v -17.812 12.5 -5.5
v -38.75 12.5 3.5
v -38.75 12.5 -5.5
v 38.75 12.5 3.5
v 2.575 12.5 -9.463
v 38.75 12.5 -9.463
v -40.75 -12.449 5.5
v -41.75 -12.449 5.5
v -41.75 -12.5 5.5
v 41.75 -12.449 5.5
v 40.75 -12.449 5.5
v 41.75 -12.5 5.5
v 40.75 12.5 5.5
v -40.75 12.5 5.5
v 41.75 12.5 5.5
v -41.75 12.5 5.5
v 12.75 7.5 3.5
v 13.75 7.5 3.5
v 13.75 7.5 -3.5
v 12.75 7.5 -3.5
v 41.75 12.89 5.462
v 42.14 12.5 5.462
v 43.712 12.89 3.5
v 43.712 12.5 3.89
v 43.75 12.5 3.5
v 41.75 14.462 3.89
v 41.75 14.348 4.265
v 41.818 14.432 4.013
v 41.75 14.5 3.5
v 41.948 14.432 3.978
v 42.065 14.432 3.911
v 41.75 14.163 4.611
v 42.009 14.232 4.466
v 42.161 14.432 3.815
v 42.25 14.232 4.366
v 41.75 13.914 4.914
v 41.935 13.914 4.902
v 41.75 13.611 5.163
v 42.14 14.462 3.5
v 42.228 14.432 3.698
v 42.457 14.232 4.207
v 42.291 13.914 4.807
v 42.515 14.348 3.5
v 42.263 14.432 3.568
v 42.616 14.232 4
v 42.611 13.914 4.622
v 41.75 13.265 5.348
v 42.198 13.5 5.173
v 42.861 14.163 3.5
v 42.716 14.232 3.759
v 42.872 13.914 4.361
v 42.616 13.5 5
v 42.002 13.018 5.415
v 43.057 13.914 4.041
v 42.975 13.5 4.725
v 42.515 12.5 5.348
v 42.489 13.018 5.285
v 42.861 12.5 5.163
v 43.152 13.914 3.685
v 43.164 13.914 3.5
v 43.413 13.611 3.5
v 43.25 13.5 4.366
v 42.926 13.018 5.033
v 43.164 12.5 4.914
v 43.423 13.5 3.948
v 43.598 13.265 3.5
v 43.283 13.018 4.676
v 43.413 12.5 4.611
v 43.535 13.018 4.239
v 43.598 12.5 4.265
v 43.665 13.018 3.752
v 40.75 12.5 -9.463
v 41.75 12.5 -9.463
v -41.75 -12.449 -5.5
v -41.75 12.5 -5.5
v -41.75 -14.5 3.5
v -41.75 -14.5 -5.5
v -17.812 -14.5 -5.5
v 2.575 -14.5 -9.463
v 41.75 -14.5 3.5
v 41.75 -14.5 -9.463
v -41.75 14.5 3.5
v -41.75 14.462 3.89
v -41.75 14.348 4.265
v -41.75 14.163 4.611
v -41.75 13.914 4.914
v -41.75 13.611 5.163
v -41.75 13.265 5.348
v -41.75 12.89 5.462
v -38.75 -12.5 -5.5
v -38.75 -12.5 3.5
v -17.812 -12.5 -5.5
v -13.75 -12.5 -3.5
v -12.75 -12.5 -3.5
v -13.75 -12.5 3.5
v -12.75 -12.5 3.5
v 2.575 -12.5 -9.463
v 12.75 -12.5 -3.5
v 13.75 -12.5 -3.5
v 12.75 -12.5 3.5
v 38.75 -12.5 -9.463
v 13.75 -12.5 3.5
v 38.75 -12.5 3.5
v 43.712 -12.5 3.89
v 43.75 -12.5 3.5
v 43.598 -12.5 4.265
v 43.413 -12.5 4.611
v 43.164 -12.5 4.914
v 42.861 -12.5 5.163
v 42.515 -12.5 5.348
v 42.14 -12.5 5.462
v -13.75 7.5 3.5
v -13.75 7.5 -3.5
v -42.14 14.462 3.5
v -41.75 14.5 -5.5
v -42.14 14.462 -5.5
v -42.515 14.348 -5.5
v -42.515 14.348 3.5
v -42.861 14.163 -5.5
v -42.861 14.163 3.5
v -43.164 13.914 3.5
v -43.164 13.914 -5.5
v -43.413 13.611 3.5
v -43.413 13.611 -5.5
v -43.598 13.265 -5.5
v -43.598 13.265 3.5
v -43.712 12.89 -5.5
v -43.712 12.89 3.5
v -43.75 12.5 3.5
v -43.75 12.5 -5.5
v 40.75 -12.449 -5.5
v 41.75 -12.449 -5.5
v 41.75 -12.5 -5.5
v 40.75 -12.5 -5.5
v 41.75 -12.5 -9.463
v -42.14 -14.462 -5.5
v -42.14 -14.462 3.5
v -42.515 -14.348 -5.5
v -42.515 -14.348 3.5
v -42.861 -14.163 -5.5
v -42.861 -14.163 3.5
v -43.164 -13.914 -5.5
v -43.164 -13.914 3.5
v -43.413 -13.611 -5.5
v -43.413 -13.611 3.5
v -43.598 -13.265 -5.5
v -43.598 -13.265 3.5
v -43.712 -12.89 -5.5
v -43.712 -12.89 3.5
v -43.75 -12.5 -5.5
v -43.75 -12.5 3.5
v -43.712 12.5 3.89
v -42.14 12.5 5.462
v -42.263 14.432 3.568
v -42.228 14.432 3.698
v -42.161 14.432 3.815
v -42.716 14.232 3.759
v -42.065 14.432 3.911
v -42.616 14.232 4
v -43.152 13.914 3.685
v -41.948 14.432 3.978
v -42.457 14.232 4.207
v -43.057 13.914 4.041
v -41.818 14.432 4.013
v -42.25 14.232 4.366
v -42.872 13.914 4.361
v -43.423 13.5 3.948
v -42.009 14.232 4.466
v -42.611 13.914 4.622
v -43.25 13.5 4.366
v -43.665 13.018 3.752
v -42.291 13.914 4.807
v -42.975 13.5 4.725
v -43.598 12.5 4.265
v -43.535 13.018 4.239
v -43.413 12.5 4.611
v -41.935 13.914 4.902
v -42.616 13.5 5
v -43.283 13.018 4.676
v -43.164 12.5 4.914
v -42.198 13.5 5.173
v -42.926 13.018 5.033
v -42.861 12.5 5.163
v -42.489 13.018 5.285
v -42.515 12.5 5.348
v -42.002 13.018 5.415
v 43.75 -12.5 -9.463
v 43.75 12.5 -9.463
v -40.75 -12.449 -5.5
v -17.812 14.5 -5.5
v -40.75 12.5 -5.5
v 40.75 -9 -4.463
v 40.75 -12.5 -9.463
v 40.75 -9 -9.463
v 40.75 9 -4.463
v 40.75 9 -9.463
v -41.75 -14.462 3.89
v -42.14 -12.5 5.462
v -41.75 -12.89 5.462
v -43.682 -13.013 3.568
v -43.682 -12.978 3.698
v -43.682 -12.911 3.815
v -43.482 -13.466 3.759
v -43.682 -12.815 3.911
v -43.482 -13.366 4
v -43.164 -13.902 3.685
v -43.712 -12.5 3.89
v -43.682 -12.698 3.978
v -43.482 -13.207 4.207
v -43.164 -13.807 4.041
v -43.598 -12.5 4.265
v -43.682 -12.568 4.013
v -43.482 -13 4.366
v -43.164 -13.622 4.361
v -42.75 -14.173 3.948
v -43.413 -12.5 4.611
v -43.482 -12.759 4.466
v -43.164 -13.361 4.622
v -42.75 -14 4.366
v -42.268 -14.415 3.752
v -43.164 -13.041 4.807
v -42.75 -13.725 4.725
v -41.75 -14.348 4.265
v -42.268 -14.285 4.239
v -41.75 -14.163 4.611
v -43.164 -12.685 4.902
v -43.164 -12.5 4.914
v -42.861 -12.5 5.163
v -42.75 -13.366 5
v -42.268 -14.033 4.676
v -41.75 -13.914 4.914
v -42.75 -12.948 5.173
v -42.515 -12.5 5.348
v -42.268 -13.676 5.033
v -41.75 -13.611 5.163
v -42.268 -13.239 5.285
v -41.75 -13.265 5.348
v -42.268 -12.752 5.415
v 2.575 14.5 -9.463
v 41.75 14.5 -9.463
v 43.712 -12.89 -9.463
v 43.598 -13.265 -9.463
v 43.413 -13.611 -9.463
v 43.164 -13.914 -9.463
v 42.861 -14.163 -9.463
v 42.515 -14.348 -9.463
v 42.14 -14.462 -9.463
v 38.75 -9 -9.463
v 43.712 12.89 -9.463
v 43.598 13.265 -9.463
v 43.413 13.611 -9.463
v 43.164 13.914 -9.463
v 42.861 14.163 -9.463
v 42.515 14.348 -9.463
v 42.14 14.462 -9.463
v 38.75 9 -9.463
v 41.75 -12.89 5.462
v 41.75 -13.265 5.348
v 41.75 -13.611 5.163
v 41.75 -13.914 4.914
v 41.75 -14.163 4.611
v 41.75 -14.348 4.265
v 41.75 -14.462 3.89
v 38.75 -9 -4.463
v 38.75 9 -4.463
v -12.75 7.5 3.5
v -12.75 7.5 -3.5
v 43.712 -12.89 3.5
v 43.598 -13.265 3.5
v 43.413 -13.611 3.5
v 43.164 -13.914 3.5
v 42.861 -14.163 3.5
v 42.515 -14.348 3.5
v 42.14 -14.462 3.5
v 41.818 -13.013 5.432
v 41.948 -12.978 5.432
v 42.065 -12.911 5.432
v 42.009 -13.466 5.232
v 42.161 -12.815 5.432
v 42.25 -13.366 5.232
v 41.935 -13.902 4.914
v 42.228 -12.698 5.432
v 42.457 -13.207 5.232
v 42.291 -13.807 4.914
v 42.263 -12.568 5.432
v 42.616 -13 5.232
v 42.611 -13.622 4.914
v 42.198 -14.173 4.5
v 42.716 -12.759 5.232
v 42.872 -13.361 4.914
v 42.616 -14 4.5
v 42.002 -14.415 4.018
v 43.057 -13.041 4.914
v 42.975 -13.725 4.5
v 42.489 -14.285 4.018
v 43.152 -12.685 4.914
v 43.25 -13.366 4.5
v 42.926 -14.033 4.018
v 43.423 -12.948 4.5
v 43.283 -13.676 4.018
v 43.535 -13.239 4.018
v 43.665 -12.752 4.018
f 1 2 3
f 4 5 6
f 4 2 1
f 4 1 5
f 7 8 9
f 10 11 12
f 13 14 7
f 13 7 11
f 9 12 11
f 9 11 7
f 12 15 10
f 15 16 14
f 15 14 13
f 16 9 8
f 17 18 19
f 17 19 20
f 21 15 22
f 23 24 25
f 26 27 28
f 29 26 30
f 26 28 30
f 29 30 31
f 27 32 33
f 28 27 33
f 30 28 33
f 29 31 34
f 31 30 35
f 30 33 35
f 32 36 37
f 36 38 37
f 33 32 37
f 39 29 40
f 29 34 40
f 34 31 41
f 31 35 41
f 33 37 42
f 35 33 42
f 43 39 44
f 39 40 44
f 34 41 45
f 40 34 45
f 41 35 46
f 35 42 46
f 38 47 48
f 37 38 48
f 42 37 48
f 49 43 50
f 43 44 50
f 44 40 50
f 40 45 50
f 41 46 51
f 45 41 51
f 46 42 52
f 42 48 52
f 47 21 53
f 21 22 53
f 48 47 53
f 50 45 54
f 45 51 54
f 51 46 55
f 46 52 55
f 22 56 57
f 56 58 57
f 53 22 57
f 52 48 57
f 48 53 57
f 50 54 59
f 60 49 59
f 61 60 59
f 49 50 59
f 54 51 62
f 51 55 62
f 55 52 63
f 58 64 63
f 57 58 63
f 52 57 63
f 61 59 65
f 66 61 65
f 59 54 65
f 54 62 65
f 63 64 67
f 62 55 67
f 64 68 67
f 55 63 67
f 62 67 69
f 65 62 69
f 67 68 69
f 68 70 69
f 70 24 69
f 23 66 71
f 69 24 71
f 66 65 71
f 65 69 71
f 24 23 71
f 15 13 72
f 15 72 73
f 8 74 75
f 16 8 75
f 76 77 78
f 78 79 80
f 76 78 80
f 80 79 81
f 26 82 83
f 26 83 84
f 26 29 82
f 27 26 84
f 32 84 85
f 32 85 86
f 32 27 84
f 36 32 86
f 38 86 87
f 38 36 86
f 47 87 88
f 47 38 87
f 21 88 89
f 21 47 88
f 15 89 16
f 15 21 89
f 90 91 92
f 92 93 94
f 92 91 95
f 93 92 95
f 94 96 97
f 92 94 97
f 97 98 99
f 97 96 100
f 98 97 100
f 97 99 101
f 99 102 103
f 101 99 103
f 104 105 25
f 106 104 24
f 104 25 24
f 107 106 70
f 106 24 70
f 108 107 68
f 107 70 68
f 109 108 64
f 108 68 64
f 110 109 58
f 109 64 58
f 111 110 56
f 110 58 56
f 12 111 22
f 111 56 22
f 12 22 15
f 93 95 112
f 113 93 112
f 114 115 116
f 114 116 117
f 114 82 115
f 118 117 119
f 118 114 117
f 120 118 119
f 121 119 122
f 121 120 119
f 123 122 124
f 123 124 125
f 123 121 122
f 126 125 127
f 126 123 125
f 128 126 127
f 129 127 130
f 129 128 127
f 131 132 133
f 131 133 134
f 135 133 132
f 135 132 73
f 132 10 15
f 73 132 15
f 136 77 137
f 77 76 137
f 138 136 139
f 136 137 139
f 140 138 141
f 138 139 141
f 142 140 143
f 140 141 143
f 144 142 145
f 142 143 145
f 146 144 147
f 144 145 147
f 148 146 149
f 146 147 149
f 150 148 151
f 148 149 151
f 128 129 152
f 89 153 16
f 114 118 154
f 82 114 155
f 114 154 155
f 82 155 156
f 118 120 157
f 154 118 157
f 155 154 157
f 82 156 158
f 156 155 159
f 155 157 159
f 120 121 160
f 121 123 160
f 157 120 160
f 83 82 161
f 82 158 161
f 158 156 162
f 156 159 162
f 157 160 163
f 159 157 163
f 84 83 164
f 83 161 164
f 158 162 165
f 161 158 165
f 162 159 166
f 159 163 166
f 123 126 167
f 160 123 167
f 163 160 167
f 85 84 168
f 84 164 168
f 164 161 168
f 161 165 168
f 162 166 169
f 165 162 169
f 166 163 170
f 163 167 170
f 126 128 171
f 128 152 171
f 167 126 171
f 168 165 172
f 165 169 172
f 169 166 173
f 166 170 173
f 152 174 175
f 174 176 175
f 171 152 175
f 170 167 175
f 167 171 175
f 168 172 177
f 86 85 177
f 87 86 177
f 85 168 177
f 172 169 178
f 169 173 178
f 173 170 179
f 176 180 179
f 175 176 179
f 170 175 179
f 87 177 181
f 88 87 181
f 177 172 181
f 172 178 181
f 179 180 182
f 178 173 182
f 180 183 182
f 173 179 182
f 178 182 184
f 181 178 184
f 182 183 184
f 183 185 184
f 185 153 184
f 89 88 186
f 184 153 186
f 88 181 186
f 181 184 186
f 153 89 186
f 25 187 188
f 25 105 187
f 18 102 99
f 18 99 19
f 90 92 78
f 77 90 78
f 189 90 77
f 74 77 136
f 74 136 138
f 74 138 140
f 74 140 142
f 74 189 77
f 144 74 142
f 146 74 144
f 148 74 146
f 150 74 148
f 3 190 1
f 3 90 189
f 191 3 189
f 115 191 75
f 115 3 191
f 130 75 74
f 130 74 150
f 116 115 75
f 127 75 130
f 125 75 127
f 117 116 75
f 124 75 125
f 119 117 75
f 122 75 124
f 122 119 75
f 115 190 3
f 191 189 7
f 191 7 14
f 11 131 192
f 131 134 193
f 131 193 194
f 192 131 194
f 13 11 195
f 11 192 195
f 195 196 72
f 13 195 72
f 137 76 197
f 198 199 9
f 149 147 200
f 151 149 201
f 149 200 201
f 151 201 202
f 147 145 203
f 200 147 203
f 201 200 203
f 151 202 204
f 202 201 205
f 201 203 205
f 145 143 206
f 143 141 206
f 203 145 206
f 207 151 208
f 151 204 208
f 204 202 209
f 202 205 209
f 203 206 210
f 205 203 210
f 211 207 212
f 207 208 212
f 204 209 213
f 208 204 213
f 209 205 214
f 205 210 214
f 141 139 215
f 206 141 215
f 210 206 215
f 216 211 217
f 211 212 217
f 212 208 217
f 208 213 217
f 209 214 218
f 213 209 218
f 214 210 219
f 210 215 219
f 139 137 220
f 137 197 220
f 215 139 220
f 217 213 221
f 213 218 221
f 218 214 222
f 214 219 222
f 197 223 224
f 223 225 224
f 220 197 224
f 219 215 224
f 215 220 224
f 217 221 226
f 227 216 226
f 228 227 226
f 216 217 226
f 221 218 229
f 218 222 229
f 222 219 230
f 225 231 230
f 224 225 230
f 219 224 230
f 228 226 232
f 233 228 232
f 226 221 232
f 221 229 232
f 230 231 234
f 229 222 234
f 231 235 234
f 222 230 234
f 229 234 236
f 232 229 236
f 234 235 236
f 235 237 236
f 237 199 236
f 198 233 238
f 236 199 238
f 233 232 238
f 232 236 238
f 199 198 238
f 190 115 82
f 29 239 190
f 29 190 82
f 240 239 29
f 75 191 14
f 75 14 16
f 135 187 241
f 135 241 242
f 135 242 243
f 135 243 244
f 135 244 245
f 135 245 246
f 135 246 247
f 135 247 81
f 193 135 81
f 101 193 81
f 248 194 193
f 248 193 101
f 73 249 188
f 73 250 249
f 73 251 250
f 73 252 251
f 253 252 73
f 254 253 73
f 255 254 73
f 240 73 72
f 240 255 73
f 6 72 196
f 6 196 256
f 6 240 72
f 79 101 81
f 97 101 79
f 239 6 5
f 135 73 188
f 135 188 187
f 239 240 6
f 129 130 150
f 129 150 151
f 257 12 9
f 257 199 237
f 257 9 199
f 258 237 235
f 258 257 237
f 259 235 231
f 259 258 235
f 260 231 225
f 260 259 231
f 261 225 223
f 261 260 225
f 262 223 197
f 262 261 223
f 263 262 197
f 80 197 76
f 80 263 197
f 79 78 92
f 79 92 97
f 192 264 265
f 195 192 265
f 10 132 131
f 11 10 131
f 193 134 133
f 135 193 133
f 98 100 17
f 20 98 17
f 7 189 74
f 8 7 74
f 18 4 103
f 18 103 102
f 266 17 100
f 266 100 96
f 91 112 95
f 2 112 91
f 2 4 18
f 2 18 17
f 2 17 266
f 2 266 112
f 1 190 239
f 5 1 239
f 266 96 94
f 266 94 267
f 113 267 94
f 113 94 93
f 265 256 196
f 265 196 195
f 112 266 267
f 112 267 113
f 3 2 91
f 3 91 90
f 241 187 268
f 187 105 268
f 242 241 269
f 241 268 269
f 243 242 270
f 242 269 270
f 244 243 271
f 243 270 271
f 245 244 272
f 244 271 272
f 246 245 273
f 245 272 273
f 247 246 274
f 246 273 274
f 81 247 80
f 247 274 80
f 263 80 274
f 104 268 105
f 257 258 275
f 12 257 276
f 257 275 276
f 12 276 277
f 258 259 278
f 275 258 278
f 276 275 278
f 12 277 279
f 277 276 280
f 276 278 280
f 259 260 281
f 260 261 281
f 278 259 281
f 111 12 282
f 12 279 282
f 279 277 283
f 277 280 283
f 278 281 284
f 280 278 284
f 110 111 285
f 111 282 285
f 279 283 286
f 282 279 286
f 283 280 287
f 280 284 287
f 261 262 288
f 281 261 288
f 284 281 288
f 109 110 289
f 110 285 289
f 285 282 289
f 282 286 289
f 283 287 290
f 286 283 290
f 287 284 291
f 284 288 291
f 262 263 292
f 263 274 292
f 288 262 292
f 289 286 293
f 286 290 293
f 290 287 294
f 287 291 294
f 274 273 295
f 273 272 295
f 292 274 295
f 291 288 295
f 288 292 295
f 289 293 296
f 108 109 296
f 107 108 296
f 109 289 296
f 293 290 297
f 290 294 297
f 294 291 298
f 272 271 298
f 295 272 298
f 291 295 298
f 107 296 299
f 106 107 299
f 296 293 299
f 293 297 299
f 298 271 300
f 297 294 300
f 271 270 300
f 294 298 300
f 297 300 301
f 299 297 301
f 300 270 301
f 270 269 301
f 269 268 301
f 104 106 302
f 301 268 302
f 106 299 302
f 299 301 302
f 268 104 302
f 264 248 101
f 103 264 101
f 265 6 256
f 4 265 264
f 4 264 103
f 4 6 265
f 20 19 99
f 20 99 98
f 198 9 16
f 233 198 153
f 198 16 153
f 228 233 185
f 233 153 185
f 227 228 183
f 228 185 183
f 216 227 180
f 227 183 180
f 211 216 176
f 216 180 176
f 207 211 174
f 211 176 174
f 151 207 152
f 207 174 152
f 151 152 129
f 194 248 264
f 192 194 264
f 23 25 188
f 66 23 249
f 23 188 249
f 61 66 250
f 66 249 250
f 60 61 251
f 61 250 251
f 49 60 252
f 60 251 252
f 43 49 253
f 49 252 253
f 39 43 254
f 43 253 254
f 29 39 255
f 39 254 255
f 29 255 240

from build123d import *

# Parameters (mm, degrees)
BOSS_EXTRUDE1_DEPTH = 14.5
BOSS_EXTRUDE2_DEPTH = 2
SKETCH9_W           = 1
SKETCH9_H           = 24.94924747
CUT_EXTRUDE7_DEPTH  = 11
SKETCH15_W          = 2
SKETCH15_H          = 25
BOSS_EXTRUDE5_DEPTH = 3.96257304
SKETCH16_W          = 5
SKETCH16_H          = 18
CUT_EXTRUDE8_DEPTH  = 2
FILLET2_R           = 2
SKETCH17_W          = 1
SKETCH17_H          = 20
BOSS_EXTRUDE6_DEPTH = 7


with BuildPart() as part:
    # Sketch1 → Boss-Extrude1 (new, symmetric)
    with BuildSketch(Plane(origin=(0, 0, 0), x_dir=(1, 0, 0), z_dir=(0, 1, 0))):
        Polygon((-43.75, 5.5), (-43.75, -5.5), (43.75, -5.5), (43.75, 5.5), (38.75, 5.5), (38.75, 3.5), (38.75, -3.5), (-38.75, -3.5), (-38.75, 3.5), (-38.75, 5.5), align=None)
    extrude(amount=BOSS_EXTRUDE1_DEPTH, both=True)

    # Sketch8 → Boss-Extrude2 (add)
    with BuildSketch(Plane.XZ.offset(14.5)):
        Polygon((-43.75, 1), (-43.75, -5.5), (-23.804915393, -5.5), (-17.812461495, -5.5), (2.574976796, -9.46257304), (43.75, -9.46257304), (43.75, -8.5), (43.75, -4.5), (43.75, -3), (43.75, -0.96257304), (43.75, 5.5), (-43.75, 5.5), (-43.75, 3), align=None)
    boss_extrude2 = extrude(amount=-BOSS_EXTRUDE2_DEPTH)

    # Mirror1: Boss-Extrude2 across plane
    add(boss_extrude2.mirror(Plane.ZX))

    # Sketch9 → Cut-Extrude7 (cut)
    with BuildSketch(Plane(origin=(0, 0, -5.5), x_dir=(-1, 0, 0), z_dir=(0, 0, -1))):
        with Locations((-41.25, 0.025376265)):
            Rectangle(SKETCH9_W, SKETCH9_H)
        with Locations((41.25, 0.025376265)):
            Rectangle(SKETCH9_W, SKETCH9_H)
    extrude(amount=-CUT_EXTRUDE7_DEPTH, mode=Mode.SUBTRACT)

    # Sketch15 → Boss-Extrude5 (add)
    with BuildSketch(Plane(origin=(0, 0, -5.5), x_dir=(-1, 0, 0), z_dir=(0, 0, -1))):
        with Locations((-42.75, 0)):
            Rectangle(SKETCH15_W, SKETCH15_H)
        with Locations((-39.75, 0)):
            Rectangle(SKETCH15_W, SKETCH15_H)
    extrude(amount=BOSS_EXTRUDE5_DEPTH)

    # Sketch16 → Cut-Extrude8 (cut)
    with BuildSketch(Plane.ZY.offset(-38.75)):
        with Locations((-6.96257304, 0)):
            Rectangle(SKETCH16_W, SKETCH16_H)
    extrude(amount=-CUT_EXTRUDE8_DEPTH, mode=Mode.SUBTRACT)

    # Fillet2
    fillet2_edges = [part.edges().sort_by_distance(p)[0] for p in [
        (43.75, -14.5, -1.98128652),
        (0, -14.5, 5.5),
        (-43.75, -14.5, 0),
        (43.75, 0, 5.5),
        (-43.75, 0, 5.5),
        (-43.75, 14.5, 0),
        (0, 14.5, 5.5),
        (43.75, 14.5, -1.98128652),
    ]]
    fillet(fillet2_edges, radius=FILLET2_R - 0.0001)  # a hair under: the kernel refuses the full size

    # Sketch17 → Boss-Extrude6 (add)
    with BuildSketch(Plane(origin=(0, 0, 3.5), x_dir=(-1, 0, 0), z_dir=(0, 0, -1))):
        with Locations((-13.25, -2.5)):
            Rectangle(SKETCH17_W, SKETCH17_H)
        with Locations((13.25, -2.5)):
            Rectangle(SKETCH17_W, SKETCH17_H)
    extrude(amount=BOSS_EXTRUDE6_DEPTH)


solid = part.part
